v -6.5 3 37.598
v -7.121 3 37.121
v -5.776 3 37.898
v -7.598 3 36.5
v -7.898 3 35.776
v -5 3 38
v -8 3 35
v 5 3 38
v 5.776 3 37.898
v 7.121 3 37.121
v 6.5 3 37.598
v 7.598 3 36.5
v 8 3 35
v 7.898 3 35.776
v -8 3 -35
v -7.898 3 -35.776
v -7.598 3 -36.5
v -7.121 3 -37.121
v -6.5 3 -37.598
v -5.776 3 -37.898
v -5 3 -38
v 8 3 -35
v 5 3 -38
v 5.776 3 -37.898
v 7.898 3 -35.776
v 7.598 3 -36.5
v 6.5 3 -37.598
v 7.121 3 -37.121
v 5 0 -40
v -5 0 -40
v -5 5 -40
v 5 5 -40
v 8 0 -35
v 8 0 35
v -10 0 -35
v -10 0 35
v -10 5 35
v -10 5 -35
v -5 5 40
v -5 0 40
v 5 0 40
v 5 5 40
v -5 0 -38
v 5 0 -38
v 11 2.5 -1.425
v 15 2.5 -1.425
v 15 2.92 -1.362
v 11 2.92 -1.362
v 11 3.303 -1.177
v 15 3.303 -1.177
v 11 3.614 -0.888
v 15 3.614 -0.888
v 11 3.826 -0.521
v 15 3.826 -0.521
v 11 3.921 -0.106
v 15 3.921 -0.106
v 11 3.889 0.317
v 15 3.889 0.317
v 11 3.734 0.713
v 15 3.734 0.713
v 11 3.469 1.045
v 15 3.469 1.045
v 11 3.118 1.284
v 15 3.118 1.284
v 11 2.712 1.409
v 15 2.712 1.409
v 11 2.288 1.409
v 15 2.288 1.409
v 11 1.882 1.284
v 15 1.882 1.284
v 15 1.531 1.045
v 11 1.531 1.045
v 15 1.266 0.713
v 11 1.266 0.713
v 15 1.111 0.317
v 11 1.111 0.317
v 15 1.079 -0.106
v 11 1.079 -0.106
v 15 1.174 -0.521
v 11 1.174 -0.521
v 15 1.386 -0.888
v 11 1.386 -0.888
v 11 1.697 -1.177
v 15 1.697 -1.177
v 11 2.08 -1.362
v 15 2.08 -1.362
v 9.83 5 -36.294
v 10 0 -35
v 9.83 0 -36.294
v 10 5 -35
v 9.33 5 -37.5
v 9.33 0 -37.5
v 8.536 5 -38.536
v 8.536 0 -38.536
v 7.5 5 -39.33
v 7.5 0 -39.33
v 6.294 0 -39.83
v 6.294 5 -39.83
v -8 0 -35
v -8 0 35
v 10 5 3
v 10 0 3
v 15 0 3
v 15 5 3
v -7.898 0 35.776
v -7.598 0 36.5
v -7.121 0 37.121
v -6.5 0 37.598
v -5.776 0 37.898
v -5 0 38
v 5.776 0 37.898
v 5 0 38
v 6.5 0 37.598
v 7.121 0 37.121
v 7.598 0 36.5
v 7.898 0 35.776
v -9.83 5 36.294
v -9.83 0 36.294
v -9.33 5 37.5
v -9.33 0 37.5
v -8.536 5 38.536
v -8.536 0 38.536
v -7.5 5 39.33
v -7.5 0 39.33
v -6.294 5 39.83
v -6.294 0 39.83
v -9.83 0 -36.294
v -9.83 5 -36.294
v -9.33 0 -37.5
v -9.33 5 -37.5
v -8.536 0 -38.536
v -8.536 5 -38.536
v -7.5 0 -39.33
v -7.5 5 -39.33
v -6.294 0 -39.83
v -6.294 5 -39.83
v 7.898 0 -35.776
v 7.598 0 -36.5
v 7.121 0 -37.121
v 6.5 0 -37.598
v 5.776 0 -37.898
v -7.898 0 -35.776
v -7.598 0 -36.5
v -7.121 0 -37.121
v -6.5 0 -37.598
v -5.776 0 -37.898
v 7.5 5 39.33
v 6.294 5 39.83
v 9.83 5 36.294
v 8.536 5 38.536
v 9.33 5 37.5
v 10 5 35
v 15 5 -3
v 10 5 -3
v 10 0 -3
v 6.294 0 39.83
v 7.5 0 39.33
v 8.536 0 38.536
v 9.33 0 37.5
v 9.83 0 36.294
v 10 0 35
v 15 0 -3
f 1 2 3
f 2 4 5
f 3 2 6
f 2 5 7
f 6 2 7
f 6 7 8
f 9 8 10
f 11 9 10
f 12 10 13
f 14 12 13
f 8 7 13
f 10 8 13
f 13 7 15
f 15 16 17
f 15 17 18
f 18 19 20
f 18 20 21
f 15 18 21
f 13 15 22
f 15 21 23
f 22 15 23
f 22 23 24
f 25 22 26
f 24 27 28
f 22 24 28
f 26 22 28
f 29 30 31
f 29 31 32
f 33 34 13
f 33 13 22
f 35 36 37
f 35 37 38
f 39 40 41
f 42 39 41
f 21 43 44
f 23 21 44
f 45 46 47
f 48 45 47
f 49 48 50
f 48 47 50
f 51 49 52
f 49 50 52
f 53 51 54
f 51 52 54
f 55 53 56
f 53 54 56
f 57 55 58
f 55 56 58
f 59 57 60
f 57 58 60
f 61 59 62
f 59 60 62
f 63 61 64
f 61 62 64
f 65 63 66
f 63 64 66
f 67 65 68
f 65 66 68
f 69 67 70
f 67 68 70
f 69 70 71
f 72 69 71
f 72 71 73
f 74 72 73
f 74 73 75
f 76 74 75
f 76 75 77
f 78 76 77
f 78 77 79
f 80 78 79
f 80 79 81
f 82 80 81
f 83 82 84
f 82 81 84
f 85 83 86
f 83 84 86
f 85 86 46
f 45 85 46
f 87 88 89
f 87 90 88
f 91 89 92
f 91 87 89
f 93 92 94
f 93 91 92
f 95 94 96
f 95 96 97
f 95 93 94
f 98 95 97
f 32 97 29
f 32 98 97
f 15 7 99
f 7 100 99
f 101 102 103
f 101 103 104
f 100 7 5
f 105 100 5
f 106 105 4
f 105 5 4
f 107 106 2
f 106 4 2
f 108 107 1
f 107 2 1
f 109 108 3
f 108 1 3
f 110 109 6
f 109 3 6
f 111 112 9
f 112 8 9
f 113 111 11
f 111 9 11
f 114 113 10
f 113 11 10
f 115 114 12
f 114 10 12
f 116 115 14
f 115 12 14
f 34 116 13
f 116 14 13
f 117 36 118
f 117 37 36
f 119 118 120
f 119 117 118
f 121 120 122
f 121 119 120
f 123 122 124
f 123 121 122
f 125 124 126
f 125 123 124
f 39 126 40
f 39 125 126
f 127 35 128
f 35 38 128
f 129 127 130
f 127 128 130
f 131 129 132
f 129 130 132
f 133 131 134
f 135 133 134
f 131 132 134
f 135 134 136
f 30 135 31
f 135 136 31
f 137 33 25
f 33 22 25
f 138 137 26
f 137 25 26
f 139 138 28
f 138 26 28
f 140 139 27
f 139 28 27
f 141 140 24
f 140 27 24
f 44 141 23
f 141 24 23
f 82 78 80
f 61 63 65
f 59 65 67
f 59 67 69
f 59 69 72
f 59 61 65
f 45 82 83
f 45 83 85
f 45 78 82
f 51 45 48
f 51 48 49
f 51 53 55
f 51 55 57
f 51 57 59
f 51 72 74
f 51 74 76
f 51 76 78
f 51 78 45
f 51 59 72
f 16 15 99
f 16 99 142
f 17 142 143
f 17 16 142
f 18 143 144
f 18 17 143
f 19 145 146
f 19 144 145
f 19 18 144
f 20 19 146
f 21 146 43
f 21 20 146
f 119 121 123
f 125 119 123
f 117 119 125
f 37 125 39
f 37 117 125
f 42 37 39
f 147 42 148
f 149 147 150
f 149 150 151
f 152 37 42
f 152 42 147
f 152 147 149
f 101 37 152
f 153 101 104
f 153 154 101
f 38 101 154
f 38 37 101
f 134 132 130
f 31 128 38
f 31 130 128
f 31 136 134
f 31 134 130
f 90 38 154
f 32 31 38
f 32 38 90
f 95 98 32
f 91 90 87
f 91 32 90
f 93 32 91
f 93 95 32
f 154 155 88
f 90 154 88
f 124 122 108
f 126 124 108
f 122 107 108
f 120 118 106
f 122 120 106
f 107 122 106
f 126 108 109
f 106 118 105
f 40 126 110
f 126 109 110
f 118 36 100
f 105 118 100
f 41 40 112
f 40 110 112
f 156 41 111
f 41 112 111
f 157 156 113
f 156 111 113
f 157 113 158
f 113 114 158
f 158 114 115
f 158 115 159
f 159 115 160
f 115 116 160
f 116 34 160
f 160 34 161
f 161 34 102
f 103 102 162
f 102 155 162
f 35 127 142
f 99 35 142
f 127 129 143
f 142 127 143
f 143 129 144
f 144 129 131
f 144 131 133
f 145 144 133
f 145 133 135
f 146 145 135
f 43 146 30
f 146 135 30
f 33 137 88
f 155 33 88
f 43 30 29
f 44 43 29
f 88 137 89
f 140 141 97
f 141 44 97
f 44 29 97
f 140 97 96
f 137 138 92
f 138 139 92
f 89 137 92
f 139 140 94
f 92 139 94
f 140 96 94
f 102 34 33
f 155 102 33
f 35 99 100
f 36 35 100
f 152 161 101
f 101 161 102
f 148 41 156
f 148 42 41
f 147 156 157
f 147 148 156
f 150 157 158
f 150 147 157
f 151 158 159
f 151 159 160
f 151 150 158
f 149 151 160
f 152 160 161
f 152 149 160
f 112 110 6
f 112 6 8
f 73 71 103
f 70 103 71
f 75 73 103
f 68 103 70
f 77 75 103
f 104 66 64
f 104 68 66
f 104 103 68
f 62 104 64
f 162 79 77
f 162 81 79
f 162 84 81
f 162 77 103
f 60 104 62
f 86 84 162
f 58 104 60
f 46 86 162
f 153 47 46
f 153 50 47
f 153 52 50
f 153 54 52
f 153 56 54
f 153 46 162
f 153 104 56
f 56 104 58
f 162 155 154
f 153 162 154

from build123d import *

# Parameters (mm, degrees)
SKETCH1_W           = 20
SKETCH1_H           = 80
BOSS_EXTRUDE1_DEPTH = 5
FILLET1_R           = 5
SHELL1_T            = -2
SKETCH2_W           = 6
SKETCH2_H           = 5
BOSS_EXTRUDE2_DEPTH = 5
SKETCH3_R           = 1.425
CUT_EXTRUDE1_DEPTH  = 4


with BuildPart() as part:
    # Sketch1 → Boss-Extrude1 (new body)
    with BuildSketch(Plane(origin=(0, 0, 0), x_dir=(1, 0, 0), z_dir=(0, 1, 0))):
        Rectangle(SKETCH1_W, SKETCH1_H)
    extrude(amount=BOSS_EXTRUDE1_DEPTH)

    # Fillet1
    fillet1_edges = [part.edges().sort_by_distance(p)[0] for p in [
        (10, 2.5, 40),
        (-10, 2.5, 40),
        (-10, 2.5, -40),
        (10, 2.5, -40),
    ]]
    fillet(fillet1_edges, radius=FILLET1_R)

    # Shell1
    shell1_openings = [part.faces().sort_by_distance(p)[0] for p in [
        (0, 0, 0),
    ]]
    offset(amount=SHELL1_T, openings=shell1_openings, kind=Kind.INTERSECTION)

    # Sketch2 → Boss-Extrude2 (add)
    with BuildSketch(Plane(origin=(10, 0, 0), x_dir=(0, 0, -1), z_dir=(1, 0, 0))):
        with Locations((0, 2.5)):
            Rectangle(SKETCH2_W, SKETCH2_H)
    extrude(amount=BOSS_EXTRUDE2_DEPTH)

    # Sketch3 → Cut-Extrude1 (cut)
    with BuildSketch(Plane(origin=(15, 0, 0), x_dir=(0, 0, -1), z_dir=(1, 0, 0))):
        with Locations((0, 2.5)):
            Circle(SKETCH3_R)
    extrude(amount=-CUT_EXTRUDE1_DEPTH, mode=Mode.SUBTRACT)


solid = part.part
